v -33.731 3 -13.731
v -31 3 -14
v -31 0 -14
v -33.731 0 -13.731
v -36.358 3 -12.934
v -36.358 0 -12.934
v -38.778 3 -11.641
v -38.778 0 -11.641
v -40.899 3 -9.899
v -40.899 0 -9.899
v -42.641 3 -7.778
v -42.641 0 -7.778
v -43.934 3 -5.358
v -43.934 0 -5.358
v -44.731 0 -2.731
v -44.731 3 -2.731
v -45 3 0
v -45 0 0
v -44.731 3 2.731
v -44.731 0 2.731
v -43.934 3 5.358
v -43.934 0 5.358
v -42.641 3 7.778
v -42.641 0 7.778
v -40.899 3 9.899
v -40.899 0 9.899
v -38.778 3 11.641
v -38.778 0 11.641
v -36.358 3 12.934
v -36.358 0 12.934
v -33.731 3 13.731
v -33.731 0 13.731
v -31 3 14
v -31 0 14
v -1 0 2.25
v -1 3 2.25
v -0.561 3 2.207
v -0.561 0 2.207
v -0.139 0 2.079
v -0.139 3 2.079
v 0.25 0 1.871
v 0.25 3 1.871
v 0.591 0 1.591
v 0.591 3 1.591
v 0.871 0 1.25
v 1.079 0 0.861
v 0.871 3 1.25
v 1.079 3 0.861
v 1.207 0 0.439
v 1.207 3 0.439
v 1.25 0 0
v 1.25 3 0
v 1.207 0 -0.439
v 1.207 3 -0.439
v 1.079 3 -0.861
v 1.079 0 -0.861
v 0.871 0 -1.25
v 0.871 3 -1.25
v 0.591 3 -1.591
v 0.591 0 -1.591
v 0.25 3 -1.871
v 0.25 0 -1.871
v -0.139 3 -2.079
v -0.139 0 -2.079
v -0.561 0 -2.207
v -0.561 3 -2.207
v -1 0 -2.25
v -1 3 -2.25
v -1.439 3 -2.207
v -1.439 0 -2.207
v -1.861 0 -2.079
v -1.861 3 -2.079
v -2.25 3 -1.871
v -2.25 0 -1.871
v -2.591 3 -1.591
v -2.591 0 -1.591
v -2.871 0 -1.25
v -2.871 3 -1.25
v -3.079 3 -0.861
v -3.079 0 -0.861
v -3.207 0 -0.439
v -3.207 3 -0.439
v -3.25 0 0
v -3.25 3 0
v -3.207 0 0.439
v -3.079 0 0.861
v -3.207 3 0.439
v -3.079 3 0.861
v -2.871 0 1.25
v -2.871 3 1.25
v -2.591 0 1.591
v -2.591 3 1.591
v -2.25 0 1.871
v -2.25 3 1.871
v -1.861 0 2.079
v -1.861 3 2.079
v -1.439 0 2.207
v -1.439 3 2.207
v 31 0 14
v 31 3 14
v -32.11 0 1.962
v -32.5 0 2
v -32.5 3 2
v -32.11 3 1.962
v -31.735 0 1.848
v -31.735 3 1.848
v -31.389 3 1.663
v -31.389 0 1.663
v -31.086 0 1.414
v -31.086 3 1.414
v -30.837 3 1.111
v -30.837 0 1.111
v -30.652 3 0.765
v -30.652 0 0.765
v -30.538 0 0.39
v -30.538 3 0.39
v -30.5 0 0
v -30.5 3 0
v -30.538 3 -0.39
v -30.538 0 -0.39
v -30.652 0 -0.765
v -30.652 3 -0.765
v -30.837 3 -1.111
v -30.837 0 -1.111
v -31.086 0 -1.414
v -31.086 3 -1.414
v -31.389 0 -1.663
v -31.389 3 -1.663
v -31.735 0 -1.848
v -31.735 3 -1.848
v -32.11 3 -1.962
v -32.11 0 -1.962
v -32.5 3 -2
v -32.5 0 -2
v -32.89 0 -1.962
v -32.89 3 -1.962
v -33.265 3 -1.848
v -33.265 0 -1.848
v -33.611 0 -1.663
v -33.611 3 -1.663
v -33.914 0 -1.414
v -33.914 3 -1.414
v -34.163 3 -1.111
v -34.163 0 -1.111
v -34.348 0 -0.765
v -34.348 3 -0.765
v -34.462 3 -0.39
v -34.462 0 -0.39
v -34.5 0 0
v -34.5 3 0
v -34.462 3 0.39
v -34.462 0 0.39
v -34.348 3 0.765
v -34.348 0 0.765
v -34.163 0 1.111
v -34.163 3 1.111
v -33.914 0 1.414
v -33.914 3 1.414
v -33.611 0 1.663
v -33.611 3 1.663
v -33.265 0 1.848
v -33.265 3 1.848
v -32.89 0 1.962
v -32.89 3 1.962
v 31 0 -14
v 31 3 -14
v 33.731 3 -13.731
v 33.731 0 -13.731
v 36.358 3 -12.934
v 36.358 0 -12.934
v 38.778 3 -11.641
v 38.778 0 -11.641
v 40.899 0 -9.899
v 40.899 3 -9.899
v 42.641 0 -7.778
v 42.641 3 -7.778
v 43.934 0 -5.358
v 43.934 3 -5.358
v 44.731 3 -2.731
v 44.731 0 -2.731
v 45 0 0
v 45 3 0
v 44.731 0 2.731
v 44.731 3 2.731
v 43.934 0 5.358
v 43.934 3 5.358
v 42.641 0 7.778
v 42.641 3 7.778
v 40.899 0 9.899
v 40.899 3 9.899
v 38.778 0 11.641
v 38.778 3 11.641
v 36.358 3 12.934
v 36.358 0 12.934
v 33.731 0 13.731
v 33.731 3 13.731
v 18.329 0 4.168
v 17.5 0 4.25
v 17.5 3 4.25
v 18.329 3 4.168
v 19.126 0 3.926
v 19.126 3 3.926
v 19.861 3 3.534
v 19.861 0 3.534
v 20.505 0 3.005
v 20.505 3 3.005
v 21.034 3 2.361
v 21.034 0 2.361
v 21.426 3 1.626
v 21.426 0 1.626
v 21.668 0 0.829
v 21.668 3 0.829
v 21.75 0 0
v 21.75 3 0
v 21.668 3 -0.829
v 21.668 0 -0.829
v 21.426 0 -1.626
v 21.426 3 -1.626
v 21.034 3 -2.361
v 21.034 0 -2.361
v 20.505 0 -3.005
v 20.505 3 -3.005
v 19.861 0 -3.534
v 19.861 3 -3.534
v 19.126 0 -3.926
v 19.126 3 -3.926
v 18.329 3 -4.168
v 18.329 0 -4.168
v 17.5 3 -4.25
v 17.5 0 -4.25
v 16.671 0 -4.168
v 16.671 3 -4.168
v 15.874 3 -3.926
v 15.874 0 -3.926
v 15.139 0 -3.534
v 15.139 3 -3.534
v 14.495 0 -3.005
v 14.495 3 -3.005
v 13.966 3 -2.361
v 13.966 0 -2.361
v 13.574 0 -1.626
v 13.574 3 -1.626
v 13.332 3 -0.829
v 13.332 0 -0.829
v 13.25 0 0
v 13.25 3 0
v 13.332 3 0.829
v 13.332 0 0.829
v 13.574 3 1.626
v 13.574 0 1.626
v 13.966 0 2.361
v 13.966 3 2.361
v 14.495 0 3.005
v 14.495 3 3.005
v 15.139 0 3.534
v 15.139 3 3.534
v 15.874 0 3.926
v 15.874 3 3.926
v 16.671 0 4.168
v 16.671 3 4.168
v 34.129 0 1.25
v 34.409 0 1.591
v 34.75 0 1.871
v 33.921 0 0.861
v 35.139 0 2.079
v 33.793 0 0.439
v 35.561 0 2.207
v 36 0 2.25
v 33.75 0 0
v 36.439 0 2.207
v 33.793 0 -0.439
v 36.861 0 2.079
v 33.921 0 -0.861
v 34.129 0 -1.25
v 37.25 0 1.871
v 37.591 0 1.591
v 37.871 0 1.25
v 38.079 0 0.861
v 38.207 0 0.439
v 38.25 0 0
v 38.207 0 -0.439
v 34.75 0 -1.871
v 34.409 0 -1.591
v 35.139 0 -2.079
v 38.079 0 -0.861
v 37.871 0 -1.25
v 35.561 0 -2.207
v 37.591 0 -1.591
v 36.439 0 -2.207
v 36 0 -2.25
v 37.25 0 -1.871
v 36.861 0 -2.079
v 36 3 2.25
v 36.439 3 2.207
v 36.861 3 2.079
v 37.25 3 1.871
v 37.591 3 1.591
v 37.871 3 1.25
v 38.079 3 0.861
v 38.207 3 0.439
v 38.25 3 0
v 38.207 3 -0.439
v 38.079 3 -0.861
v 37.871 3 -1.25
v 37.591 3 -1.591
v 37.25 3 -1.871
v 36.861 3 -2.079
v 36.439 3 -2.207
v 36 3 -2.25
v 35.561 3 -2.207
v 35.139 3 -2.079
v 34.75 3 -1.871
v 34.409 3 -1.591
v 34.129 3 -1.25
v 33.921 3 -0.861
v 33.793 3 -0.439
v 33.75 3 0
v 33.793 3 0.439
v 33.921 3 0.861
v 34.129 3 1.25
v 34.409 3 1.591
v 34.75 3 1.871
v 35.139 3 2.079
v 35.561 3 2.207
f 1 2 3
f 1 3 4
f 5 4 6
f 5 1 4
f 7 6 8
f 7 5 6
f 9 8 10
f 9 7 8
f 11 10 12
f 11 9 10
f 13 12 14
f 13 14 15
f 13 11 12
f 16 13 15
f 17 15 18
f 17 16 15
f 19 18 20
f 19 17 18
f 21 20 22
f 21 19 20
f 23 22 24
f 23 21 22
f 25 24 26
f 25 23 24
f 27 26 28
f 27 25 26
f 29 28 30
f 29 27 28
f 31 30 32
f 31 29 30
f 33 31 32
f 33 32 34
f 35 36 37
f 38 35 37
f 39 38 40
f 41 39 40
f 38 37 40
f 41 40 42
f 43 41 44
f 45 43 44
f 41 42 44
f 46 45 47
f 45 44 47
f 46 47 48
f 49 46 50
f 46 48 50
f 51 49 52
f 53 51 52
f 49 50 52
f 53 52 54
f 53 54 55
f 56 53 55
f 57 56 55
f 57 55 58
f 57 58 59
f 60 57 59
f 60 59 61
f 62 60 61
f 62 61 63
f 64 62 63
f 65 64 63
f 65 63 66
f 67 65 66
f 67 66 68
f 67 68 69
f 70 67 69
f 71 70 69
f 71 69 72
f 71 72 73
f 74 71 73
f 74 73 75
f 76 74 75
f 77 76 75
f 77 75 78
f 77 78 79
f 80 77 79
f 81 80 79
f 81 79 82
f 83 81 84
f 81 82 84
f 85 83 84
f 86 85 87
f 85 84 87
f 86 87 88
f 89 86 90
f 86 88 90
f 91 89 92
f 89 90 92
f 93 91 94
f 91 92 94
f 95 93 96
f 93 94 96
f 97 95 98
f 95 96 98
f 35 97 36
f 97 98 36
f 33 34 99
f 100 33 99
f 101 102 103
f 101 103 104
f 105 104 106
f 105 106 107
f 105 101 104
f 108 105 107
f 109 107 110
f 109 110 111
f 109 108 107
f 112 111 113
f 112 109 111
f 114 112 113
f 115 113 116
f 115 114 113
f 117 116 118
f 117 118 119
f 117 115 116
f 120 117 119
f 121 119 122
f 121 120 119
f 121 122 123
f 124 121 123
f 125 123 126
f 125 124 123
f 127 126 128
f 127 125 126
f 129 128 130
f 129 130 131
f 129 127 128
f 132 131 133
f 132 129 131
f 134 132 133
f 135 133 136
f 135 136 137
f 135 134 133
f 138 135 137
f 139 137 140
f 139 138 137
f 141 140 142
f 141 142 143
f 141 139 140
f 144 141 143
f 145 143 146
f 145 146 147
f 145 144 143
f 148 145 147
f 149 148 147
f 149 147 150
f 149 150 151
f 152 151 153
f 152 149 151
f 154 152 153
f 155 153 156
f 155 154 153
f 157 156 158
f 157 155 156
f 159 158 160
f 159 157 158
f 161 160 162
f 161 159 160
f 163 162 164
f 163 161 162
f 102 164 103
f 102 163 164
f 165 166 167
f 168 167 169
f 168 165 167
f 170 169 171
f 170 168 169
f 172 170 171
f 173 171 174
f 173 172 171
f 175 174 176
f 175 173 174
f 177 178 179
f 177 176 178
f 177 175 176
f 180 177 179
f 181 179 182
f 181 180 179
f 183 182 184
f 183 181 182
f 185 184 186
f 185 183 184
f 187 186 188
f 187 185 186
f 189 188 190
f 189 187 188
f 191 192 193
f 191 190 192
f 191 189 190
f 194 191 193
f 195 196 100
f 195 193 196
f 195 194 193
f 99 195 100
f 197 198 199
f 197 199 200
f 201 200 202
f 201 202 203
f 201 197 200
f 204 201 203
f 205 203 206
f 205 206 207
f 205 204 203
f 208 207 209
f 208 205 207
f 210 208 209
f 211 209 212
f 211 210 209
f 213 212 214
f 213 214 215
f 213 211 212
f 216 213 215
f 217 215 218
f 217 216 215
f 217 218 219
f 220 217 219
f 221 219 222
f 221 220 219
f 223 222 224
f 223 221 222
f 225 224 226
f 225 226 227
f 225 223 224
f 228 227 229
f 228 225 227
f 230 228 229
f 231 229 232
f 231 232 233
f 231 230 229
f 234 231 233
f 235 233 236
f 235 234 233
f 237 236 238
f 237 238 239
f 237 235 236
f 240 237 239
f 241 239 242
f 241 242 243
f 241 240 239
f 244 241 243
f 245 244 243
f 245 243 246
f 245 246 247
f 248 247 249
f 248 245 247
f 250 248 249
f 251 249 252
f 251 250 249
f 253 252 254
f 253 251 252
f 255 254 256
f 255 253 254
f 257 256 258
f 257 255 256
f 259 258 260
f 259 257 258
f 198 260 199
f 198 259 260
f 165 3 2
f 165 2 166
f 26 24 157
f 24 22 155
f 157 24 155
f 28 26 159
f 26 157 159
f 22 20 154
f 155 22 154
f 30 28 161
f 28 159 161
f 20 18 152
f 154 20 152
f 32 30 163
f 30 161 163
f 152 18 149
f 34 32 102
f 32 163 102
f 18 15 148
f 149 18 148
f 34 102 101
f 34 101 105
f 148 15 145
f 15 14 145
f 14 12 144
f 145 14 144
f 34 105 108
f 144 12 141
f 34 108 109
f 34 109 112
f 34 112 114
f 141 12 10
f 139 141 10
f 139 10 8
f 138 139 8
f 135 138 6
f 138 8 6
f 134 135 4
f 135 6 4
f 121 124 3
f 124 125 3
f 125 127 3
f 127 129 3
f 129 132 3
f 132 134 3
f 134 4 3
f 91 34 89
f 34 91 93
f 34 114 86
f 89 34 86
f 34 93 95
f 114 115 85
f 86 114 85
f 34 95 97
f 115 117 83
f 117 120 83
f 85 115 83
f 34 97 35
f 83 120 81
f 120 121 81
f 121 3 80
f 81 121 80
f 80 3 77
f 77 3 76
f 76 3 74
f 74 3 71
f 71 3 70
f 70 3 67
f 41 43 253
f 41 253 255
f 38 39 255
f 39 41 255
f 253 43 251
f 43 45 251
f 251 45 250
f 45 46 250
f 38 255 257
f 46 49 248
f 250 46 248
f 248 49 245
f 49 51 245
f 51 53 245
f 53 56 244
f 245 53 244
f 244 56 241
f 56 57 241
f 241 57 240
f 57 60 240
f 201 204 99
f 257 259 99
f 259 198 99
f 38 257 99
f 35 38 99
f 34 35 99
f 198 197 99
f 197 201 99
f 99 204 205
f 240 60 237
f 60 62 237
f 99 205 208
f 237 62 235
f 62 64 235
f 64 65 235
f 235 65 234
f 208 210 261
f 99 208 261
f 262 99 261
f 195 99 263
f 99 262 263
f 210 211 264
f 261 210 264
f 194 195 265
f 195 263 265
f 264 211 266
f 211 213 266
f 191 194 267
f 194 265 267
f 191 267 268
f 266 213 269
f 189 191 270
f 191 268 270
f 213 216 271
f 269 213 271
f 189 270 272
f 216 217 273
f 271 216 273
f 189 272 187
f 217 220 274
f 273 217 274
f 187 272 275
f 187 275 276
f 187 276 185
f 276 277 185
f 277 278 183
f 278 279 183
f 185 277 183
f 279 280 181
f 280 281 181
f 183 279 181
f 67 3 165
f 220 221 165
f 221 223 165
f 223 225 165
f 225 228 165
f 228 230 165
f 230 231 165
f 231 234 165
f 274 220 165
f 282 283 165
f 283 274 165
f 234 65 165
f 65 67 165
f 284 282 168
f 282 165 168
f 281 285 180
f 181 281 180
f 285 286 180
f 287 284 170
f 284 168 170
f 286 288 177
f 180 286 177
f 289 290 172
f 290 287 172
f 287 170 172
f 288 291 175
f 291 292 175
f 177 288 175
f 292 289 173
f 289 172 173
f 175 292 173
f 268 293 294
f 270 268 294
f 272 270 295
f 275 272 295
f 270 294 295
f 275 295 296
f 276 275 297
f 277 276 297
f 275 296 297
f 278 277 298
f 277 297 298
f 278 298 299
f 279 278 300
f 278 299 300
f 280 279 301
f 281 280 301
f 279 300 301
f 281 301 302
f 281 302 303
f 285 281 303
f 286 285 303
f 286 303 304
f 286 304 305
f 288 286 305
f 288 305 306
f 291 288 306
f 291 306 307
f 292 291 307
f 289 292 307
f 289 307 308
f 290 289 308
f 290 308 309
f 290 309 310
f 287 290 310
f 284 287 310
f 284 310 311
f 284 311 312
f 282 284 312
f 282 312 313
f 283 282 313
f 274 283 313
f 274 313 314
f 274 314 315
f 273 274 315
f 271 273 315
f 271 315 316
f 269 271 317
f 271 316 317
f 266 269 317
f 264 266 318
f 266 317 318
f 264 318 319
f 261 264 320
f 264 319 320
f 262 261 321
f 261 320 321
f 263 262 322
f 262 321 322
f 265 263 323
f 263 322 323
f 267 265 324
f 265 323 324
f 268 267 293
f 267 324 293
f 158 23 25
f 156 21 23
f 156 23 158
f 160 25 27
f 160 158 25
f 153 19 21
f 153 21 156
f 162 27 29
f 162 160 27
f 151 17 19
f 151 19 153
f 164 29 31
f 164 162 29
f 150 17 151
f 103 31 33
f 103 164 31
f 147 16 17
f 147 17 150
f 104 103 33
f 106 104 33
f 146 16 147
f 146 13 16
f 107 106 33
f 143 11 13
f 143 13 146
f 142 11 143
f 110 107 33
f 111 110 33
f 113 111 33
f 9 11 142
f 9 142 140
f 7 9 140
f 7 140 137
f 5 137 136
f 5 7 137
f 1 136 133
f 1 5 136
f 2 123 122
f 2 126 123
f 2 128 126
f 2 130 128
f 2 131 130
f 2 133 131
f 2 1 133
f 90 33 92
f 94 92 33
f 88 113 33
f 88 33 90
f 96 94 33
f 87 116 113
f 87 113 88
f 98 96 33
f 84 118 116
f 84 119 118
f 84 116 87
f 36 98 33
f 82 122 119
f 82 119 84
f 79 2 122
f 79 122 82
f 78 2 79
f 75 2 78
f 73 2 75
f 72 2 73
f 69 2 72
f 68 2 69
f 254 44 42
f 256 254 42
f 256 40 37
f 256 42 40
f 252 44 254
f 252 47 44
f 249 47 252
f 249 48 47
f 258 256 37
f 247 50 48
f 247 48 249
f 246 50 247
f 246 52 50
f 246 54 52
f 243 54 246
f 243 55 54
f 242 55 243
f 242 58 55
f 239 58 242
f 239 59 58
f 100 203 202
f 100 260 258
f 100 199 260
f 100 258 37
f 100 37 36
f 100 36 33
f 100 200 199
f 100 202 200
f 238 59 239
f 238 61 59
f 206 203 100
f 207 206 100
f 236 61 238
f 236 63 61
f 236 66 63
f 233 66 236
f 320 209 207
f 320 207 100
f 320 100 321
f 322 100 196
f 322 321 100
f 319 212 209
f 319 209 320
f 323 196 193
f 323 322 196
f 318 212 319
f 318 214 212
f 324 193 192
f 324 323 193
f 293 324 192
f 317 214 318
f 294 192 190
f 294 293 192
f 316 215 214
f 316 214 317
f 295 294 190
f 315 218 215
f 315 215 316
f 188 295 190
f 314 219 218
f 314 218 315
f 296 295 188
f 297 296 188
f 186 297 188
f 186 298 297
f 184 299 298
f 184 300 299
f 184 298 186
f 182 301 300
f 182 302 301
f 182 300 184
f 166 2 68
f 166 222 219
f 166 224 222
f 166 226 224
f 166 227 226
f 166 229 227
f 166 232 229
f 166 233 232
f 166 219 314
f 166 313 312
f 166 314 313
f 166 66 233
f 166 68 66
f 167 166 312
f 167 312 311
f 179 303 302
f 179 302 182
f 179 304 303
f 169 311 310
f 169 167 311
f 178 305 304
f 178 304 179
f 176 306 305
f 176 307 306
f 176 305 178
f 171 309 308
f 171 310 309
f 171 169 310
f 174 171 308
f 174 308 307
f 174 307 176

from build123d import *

# Parameters (mm, degrees)
SKETCH_1_W          = 90
SKETCH_1_H          = 28
SKETCH_1_R          = 4.25
SKETCH_1_R_2        = 2
EXTRUDE_1_DEPTH     = 3
CUT_EXTRUDE_1_REACH = 49.223
SKETCH_3_R          = 2.25
FILLET_1_RADIUS     = 14
FILLET_1_LENGTH     = 3
FILLET_2_RADIUS     = 14
FILLET_2_LENGTH     = 3


with BuildPart() as part:
    # 草图1 → 凸台-拉伸1 (new body)
    with BuildSketch(Plane(origin=(0, 0, 0), x_dir=(1, 0, 0), z_dir=(0, 1, 0))):
        Rectangle(SKETCH_1_W, SKETCH_1_H)
        with Locations(Location((17.5, 0, 0), (0, 0, 270))):
            Circle(SKETCH_1_R, mode=Mode.SUBTRACT)
        with Locations(Location((-32.5, 0, 0), (0, 0, 270))):
            Circle(SKETCH_1_R_2, mode=Mode.SUBTRACT)
    extrude(amount=EXTRUDE_1_DEPTH)

    # 草图3 → 切除-拉伸1 (cut, up to next)
    with BuildSketch(Plane(origin=(0, 3, 0), x_dir=(1, 0, 0), z_dir=(0, 1, 0)), mode=Mode.PRIVATE) as cut_extrude_1_sk1:
        with Locations(Location((36, 0, 0), (0, 0, 270))):
            Circle(SKETCH_3_R)
    cut_extrude_1_tool1 = extrude(cut_extrude_1_sk1.sketch, amount=-CUT_EXTRUDE_1_REACH, mode=Mode.PRIVATE) & part.part
    # 草图3 → 切除-拉伸1 (cut, up to next)
    with BuildSketch(Plane(origin=(0, 3, 0), x_dir=(1, 0, 0), z_dir=(0, 1, 0)), mode=Mode.PRIVATE) as cut_extrude_1_sk2:
        with Locations(Location((-1, 0, 0), (0, 0, 270))):
            Circle(SKETCH_3_R)
    cut_extrude_1_tool2 = extrude(cut_extrude_1_sk2.sketch, amount=-CUT_EXTRUDE_1_REACH, mode=Mode.PRIVATE) & part.part
    add(cut_extrude_1_tool1.solids().sort_by_distance((36, 3, 0))[0], mode=Mode.SUBTRACT)
    add(cut_extrude_1_tool2.solids().sort_by_distance((-1, 3, 0))[0], mode=Mode.SUBTRACT)

    # 圆角1: full round fillet: the end face becomes a half cylinder, R = half its width
    fillet_1_face = Plane((-45, 1.5, 0), x_dir=(0, 1, 0), z_dir=(-1, 0, 0))  # on the end face: x along it, z out of the body
    fillet_1_slab = fillet_1_face.offset(-FILLET_1_RADIUS / 2) * Box(FILLET_1_LENGTH, 2 * FILLET_1_RADIUS, FILLET_1_RADIUS, mode=Mode.PRIVATE)  # the body's end, R deep
    fillet_1_round = Plane((-31, 1.5, 0), x_dir=(-1, 0, 0), z_dir=(0, 1, 0)) * Cylinder(FILLET_1_RADIUS, FILLET_1_LENGTH, mode=Mode.PRIVATE)  # its axis R under the face
    add(fillet_1_slab - fillet_1_round, mode=Mode.SUBTRACT)

    # 圆角2: full round fillet: the end face becomes a half cylinder, R = half its width
    fillet_2_face = Plane((45, 1.5, 0), x_dir=(0, -1, 0), z_dir=(1, 0, 0))  # on the end face: x along it, z out of the body
    fillet_2_slab = fillet_2_face.offset(-FILLET_2_RADIUS / 2) * Box(FILLET_2_LENGTH, 2 * FILLET_2_RADIUS, FILLET_2_RADIUS, mode=Mode.PRIVATE)  # the body's end, R deep
    fillet_2_round = Plane((31, 1.5, 0), x_dir=(1, 0, 0), z_dir=(0, -1, 0)) * Cylinder(FILLET_2_RADIUS, FILLET_2_LENGTH, mode=Mode.PRIVATE)  # its axis R under the face
    add(fillet_2_slab - fillet_2_round, mode=Mode.SUBTRACT)


solid = part.part
